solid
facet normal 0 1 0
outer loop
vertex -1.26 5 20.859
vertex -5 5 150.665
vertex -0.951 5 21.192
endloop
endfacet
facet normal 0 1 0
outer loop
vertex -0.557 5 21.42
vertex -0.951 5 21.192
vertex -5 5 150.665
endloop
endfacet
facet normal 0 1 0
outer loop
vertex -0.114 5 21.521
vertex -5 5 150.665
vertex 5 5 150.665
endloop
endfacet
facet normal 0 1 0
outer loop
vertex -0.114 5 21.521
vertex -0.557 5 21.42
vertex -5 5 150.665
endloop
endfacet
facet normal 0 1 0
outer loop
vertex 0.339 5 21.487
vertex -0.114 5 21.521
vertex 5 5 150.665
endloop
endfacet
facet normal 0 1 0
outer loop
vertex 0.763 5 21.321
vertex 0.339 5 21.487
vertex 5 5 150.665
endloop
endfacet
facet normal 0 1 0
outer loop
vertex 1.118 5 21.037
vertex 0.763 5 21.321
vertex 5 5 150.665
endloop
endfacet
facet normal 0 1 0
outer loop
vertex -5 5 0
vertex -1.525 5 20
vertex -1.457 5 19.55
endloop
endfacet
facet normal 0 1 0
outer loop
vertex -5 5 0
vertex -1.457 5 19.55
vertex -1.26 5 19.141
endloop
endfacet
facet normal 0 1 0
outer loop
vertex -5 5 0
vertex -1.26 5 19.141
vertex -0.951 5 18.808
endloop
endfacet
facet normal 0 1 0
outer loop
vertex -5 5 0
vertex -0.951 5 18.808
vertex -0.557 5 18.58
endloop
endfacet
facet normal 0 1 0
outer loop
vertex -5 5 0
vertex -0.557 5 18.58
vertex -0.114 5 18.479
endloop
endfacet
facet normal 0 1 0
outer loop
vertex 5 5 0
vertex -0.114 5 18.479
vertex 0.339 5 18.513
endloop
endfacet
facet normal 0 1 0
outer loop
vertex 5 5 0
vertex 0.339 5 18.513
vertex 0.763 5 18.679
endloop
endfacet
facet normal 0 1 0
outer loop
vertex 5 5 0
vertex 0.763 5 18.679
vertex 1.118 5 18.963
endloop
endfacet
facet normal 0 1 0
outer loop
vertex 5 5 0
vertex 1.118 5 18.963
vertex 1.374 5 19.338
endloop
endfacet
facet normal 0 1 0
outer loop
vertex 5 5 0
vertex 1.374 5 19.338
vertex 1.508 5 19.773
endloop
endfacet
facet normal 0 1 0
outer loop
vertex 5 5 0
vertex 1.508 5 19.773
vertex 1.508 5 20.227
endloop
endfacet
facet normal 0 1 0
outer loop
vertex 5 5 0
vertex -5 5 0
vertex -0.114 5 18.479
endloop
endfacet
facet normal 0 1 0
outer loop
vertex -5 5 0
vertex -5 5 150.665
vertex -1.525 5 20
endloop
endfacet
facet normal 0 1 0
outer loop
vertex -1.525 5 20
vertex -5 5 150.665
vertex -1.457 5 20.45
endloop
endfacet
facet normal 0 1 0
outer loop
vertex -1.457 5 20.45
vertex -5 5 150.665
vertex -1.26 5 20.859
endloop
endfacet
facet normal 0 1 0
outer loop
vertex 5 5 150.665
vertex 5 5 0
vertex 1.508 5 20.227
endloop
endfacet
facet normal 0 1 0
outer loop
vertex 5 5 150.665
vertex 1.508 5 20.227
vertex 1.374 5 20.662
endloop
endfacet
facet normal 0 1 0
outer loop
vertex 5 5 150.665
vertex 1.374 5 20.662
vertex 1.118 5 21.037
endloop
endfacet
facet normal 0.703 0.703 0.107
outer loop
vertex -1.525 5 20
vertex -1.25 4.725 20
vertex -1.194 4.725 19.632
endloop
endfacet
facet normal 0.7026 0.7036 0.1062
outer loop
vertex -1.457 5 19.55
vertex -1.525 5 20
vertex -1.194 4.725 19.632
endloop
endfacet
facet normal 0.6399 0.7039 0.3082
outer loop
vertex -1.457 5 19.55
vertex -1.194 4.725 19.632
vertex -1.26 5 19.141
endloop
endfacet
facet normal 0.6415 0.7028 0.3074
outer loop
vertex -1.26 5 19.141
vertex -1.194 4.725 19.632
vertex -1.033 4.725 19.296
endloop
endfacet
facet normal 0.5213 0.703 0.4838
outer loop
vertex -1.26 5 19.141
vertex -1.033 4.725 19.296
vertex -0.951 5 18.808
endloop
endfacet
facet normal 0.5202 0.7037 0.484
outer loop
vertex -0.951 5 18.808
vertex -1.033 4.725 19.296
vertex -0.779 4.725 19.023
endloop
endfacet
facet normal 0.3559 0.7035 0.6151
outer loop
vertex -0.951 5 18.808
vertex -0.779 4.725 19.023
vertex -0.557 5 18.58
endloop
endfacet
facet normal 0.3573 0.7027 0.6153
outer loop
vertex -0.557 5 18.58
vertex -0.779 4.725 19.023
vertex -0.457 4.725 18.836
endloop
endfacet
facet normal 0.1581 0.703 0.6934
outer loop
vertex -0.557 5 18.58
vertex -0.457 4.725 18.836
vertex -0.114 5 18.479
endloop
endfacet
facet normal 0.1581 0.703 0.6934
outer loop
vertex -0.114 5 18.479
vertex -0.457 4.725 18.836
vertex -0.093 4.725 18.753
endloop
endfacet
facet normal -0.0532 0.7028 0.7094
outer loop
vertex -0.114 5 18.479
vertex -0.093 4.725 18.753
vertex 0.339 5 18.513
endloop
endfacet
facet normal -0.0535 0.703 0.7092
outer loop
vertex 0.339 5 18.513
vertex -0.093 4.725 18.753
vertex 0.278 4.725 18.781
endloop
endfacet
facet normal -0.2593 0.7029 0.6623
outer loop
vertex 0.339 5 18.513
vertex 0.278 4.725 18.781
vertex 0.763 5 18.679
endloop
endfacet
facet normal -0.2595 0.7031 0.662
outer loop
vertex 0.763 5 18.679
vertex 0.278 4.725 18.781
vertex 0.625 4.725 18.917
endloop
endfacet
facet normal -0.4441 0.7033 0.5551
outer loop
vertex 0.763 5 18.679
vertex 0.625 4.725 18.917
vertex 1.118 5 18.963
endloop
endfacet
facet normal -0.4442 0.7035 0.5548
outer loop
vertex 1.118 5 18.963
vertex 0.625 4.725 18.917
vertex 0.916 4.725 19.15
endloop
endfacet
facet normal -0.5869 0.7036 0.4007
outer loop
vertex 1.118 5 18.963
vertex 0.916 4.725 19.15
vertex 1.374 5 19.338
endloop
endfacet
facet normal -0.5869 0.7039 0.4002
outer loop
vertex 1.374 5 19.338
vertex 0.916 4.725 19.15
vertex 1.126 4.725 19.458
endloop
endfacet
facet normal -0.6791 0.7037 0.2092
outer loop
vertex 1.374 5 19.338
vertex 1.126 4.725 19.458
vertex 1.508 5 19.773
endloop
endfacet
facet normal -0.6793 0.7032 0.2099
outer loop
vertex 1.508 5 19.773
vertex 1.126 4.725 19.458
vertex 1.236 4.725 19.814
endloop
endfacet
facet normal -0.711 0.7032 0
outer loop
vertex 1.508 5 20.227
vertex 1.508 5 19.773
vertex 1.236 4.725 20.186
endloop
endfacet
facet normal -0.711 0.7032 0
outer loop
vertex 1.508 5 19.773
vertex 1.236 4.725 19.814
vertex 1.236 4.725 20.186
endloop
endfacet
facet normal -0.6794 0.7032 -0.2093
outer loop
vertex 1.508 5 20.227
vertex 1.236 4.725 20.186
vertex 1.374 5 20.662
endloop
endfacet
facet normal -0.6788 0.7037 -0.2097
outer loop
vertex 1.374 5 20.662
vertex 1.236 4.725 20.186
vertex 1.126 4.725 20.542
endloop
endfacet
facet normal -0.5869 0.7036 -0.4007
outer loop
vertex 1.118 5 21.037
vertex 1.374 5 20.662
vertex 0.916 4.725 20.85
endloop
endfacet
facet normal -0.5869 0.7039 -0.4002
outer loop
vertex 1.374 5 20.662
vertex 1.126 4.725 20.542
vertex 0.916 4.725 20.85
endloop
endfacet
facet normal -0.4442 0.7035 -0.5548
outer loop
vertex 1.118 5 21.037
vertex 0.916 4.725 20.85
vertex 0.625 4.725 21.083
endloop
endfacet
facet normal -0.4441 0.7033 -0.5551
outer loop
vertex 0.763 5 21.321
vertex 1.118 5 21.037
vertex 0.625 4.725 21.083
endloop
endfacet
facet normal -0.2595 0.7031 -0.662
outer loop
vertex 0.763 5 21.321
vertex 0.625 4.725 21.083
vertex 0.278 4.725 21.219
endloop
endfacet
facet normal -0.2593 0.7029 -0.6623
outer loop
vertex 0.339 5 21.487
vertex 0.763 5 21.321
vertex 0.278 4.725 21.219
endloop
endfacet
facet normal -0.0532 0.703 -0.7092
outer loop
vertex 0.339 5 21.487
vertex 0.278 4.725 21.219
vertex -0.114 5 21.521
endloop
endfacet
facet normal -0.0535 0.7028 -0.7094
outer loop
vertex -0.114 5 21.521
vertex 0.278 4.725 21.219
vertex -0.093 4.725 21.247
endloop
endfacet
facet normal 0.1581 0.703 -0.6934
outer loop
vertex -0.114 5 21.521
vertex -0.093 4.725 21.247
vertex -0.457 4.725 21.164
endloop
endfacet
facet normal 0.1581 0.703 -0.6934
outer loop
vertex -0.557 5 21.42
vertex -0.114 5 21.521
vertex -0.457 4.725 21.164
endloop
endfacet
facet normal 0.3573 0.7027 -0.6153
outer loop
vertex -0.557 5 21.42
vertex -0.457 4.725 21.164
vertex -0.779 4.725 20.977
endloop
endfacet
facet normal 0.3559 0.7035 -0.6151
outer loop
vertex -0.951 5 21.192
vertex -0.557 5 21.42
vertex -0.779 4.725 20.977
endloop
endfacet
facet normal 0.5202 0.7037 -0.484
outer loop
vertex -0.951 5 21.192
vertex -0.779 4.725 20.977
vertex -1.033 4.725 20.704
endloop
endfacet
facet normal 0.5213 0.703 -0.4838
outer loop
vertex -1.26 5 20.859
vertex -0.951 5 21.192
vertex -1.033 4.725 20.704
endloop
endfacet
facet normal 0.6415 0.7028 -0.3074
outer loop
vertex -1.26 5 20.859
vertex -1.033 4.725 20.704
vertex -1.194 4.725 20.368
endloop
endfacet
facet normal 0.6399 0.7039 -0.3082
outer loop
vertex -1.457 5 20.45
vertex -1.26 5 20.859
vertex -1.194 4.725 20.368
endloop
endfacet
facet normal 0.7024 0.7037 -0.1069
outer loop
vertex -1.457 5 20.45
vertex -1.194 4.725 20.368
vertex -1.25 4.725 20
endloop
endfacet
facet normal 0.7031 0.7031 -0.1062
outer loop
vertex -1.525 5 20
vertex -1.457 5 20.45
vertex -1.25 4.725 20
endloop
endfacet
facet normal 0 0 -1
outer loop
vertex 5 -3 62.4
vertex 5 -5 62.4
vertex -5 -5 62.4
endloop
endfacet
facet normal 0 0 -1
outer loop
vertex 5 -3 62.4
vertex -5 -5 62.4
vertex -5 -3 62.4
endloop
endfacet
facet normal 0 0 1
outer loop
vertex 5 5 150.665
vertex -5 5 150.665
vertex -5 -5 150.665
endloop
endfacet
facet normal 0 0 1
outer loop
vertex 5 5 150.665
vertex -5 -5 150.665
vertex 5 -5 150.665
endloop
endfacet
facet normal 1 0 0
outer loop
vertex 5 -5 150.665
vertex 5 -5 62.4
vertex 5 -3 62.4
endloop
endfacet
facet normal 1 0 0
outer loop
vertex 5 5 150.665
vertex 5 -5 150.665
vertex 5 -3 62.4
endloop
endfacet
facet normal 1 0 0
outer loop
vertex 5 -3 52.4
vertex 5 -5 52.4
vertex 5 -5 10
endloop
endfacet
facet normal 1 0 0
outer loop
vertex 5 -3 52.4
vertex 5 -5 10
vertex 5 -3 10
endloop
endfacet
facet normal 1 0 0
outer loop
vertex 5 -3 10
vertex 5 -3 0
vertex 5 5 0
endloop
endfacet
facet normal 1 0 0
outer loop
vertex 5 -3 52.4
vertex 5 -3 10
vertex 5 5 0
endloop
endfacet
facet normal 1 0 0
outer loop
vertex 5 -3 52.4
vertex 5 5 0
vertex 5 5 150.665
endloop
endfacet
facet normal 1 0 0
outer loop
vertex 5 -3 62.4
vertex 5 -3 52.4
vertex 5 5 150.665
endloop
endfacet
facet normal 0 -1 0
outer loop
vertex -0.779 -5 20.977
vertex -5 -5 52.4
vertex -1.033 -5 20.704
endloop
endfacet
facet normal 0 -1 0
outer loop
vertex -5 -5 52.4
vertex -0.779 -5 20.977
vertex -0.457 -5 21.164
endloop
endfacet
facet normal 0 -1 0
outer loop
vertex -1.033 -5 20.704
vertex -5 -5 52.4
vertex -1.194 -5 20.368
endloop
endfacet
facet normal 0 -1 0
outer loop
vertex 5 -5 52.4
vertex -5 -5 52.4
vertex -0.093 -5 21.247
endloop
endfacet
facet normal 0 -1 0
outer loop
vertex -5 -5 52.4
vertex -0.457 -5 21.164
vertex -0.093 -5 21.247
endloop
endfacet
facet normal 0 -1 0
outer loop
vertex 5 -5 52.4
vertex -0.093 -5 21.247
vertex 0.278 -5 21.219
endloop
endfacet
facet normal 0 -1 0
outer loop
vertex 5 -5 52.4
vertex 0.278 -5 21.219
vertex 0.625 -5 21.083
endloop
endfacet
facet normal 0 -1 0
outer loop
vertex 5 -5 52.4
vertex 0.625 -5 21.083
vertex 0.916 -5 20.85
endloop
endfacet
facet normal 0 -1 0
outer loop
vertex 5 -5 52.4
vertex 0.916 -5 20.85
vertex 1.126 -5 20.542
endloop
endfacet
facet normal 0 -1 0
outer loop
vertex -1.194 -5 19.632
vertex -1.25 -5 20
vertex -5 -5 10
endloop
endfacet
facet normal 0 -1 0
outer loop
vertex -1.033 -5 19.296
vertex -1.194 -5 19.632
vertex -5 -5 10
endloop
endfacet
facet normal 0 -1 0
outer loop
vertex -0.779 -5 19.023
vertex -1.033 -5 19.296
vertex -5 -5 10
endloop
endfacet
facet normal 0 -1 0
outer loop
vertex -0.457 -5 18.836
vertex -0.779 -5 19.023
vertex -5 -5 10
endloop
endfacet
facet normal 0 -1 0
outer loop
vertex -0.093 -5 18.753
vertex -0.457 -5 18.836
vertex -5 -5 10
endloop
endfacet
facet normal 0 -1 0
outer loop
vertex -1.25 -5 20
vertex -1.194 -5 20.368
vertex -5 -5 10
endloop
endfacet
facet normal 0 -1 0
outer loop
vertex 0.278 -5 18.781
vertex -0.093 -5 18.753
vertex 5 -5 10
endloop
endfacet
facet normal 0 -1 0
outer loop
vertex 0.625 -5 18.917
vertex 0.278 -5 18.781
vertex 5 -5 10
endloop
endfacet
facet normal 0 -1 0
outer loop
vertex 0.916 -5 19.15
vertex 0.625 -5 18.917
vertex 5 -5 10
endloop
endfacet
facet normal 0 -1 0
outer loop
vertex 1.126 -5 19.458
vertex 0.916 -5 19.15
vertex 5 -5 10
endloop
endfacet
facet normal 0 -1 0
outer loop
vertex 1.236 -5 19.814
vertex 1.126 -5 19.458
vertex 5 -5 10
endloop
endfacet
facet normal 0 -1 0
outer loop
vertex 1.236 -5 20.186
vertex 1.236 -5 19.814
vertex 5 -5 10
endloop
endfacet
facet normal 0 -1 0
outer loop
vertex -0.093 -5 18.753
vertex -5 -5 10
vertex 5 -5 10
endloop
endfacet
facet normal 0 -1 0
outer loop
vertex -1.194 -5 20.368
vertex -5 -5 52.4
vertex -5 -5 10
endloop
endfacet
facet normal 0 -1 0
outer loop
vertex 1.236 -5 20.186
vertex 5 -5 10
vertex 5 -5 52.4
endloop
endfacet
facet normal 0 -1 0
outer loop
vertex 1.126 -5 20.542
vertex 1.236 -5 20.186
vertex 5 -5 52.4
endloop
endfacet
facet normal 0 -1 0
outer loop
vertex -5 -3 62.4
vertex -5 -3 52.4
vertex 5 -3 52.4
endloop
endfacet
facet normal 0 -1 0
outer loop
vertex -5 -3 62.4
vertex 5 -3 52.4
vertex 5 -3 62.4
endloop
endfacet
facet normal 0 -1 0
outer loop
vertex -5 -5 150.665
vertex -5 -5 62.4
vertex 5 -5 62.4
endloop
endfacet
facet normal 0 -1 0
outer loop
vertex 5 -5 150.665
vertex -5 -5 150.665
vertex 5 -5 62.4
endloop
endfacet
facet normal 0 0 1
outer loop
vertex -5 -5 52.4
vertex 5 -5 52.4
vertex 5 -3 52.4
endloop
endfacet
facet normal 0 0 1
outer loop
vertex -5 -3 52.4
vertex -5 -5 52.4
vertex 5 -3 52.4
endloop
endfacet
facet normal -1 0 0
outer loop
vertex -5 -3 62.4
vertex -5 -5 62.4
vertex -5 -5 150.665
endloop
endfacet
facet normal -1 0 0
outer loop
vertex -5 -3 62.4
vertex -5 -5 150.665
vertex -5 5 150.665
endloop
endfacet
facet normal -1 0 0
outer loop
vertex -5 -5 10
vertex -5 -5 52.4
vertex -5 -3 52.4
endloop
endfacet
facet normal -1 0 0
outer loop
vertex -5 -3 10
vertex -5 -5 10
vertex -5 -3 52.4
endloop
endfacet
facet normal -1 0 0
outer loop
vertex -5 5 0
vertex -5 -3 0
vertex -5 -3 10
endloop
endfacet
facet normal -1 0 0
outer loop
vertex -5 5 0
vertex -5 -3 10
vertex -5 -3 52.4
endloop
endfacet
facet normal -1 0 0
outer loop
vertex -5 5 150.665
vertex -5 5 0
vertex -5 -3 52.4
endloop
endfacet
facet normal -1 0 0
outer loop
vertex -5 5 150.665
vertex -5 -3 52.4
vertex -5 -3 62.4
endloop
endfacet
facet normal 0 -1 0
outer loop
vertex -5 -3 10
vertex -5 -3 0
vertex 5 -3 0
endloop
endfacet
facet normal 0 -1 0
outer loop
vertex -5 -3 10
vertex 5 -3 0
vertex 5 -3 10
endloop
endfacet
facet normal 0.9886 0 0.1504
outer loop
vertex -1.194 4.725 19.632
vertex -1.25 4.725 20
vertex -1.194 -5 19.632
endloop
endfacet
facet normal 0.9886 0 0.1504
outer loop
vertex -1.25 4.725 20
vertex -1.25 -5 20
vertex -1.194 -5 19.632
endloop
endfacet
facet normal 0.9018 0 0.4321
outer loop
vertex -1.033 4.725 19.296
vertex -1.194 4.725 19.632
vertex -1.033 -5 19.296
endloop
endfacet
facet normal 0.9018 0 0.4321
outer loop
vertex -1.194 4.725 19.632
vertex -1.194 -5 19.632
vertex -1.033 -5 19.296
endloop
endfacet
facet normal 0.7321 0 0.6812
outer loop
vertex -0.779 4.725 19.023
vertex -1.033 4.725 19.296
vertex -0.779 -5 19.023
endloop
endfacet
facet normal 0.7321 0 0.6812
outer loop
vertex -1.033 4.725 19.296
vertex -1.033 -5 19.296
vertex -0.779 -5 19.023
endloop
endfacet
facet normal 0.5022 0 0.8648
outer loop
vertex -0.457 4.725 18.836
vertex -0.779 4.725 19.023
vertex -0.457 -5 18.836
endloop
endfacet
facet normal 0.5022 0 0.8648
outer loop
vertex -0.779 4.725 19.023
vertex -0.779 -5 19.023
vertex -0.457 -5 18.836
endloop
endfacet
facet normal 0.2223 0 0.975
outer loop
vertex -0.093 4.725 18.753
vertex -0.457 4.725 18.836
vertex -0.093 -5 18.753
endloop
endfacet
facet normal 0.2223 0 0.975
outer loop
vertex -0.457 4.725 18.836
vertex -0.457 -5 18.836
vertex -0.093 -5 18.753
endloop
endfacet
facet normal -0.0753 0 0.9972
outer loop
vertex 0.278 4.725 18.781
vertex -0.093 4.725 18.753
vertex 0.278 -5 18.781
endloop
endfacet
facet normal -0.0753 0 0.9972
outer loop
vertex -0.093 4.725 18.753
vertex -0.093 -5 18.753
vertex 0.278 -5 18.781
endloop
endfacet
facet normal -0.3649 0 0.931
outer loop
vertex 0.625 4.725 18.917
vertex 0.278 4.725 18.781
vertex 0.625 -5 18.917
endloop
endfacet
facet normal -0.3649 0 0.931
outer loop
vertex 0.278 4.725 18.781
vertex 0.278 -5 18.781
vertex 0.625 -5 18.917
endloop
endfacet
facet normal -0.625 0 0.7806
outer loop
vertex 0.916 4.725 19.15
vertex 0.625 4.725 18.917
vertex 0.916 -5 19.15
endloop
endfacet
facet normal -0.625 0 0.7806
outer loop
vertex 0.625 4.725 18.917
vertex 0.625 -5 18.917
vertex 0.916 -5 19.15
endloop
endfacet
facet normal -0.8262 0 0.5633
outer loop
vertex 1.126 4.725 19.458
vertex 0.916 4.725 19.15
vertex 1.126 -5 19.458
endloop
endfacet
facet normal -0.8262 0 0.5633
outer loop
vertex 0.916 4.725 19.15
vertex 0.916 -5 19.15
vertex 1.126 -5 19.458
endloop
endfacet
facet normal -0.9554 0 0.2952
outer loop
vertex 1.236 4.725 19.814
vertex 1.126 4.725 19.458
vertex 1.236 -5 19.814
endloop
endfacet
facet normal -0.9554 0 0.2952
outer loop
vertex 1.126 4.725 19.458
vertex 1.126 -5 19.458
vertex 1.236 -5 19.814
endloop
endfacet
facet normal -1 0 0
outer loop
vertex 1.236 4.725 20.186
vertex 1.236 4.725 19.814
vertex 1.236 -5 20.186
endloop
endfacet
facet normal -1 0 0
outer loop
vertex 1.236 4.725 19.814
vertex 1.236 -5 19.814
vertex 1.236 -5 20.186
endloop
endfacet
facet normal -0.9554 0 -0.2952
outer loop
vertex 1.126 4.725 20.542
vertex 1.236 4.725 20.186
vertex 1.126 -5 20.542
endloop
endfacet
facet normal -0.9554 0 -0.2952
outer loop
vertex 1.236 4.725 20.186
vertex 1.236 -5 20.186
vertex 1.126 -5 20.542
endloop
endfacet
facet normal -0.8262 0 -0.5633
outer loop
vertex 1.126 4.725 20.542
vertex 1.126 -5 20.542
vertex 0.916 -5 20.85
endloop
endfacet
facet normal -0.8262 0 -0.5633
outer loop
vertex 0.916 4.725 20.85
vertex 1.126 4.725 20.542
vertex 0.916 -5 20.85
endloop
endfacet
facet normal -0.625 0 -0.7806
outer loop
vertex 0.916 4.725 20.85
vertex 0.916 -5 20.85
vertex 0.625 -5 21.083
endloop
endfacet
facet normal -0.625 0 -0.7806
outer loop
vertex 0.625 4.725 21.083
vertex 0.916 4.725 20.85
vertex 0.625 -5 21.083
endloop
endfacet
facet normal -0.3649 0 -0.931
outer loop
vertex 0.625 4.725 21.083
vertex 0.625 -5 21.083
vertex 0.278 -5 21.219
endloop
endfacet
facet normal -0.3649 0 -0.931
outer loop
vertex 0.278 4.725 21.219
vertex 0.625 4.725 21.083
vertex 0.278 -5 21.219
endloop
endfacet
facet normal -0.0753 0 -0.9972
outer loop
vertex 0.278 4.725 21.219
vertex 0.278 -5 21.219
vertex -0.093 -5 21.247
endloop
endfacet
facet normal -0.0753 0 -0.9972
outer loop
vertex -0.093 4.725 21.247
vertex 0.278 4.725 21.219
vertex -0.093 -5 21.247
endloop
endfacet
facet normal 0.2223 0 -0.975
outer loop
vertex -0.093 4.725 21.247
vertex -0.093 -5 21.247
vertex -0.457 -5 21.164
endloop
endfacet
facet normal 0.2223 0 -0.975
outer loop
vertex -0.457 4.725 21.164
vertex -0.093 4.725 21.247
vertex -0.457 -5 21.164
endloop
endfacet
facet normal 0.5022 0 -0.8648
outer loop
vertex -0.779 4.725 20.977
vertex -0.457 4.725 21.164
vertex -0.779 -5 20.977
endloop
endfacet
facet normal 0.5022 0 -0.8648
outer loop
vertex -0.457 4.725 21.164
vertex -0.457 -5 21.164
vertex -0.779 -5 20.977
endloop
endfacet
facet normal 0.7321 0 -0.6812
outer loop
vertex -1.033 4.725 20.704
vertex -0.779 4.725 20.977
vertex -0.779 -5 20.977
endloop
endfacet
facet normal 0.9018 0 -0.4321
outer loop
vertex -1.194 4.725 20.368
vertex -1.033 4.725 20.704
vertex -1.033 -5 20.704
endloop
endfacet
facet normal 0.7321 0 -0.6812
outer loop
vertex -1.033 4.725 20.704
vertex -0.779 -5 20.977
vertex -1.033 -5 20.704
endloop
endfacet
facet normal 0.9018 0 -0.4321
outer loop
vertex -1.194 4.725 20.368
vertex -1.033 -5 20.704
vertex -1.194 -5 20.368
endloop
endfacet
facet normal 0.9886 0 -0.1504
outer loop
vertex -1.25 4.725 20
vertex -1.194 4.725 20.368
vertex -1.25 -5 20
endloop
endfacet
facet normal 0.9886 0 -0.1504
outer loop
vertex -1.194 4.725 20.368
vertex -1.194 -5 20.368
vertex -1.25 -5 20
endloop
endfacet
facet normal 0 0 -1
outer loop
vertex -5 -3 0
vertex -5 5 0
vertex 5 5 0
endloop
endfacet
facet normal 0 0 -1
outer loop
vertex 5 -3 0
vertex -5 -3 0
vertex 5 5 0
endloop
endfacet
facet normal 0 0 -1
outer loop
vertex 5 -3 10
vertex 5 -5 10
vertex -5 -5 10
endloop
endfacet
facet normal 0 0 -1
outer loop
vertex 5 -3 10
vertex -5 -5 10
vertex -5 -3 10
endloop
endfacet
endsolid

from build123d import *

# Parameters (mm, degrees)
ESQUISSE1_W                     = 10
ESQUISSE1_H                     = 10
BOSS_EXTRU_1_DEPTH              = 150.664880645
ESQUISSE2_W                     = 10
ESQUISSE2_H                     = 2
ENL_V_MAT_EXTRU_1_DEPTH         = 152.079139062
TROU_TARAUD_M3X0_51_D           = 2.5
TROU_TARAUD_M3X0_51_CSINK_D     = 3.05
TROU_TARAUD_M3X0_51_CSINK_ANGLE = 90


with BuildPart() as part:
    # Esquisse1 → Boss.-Extru.1 (new body)
    with BuildSketch(Plane.XY):
        Rectangle(ESQUISSE1_W, ESQUISSE1_H)
    extrude(amount=BOSS_EXTRU_1_DEPTH)

    # Esquisse2 → Enlèv. mat.-Extru.1 (cut, through all)
    with BuildSketch(Plane.ZY.offset(5)):
        with Locations((5, -4)):
            Rectangle(ESQUISSE2_W, ESQUISSE2_H)
        with Locations((57.4, -4)):
            Rectangle(ESQUISSE2_W, ESQUISSE2_H)
    extrude(amount=-ENL_V_MAT_EXTRU_1_DEPTH, mode=Mode.SUBTRACT)

    # Trou taraudé M3x0.51 (through all)
    with Locations(Plane(origin=(0, 5, 0), x_dir=(1, 0, 0), z_dir=(0, 1, 0))):
        with Locations((0, -20)):
            CounterSinkHole(TROU_TARAUD_M3X0_51_D / 2, TROU_TARAUD_M3X0_51_CSINK_D / 2, counter_sink_angle=TROU_TARAUD_M3X0_51_CSINK_ANGLE)


solid = part.part
